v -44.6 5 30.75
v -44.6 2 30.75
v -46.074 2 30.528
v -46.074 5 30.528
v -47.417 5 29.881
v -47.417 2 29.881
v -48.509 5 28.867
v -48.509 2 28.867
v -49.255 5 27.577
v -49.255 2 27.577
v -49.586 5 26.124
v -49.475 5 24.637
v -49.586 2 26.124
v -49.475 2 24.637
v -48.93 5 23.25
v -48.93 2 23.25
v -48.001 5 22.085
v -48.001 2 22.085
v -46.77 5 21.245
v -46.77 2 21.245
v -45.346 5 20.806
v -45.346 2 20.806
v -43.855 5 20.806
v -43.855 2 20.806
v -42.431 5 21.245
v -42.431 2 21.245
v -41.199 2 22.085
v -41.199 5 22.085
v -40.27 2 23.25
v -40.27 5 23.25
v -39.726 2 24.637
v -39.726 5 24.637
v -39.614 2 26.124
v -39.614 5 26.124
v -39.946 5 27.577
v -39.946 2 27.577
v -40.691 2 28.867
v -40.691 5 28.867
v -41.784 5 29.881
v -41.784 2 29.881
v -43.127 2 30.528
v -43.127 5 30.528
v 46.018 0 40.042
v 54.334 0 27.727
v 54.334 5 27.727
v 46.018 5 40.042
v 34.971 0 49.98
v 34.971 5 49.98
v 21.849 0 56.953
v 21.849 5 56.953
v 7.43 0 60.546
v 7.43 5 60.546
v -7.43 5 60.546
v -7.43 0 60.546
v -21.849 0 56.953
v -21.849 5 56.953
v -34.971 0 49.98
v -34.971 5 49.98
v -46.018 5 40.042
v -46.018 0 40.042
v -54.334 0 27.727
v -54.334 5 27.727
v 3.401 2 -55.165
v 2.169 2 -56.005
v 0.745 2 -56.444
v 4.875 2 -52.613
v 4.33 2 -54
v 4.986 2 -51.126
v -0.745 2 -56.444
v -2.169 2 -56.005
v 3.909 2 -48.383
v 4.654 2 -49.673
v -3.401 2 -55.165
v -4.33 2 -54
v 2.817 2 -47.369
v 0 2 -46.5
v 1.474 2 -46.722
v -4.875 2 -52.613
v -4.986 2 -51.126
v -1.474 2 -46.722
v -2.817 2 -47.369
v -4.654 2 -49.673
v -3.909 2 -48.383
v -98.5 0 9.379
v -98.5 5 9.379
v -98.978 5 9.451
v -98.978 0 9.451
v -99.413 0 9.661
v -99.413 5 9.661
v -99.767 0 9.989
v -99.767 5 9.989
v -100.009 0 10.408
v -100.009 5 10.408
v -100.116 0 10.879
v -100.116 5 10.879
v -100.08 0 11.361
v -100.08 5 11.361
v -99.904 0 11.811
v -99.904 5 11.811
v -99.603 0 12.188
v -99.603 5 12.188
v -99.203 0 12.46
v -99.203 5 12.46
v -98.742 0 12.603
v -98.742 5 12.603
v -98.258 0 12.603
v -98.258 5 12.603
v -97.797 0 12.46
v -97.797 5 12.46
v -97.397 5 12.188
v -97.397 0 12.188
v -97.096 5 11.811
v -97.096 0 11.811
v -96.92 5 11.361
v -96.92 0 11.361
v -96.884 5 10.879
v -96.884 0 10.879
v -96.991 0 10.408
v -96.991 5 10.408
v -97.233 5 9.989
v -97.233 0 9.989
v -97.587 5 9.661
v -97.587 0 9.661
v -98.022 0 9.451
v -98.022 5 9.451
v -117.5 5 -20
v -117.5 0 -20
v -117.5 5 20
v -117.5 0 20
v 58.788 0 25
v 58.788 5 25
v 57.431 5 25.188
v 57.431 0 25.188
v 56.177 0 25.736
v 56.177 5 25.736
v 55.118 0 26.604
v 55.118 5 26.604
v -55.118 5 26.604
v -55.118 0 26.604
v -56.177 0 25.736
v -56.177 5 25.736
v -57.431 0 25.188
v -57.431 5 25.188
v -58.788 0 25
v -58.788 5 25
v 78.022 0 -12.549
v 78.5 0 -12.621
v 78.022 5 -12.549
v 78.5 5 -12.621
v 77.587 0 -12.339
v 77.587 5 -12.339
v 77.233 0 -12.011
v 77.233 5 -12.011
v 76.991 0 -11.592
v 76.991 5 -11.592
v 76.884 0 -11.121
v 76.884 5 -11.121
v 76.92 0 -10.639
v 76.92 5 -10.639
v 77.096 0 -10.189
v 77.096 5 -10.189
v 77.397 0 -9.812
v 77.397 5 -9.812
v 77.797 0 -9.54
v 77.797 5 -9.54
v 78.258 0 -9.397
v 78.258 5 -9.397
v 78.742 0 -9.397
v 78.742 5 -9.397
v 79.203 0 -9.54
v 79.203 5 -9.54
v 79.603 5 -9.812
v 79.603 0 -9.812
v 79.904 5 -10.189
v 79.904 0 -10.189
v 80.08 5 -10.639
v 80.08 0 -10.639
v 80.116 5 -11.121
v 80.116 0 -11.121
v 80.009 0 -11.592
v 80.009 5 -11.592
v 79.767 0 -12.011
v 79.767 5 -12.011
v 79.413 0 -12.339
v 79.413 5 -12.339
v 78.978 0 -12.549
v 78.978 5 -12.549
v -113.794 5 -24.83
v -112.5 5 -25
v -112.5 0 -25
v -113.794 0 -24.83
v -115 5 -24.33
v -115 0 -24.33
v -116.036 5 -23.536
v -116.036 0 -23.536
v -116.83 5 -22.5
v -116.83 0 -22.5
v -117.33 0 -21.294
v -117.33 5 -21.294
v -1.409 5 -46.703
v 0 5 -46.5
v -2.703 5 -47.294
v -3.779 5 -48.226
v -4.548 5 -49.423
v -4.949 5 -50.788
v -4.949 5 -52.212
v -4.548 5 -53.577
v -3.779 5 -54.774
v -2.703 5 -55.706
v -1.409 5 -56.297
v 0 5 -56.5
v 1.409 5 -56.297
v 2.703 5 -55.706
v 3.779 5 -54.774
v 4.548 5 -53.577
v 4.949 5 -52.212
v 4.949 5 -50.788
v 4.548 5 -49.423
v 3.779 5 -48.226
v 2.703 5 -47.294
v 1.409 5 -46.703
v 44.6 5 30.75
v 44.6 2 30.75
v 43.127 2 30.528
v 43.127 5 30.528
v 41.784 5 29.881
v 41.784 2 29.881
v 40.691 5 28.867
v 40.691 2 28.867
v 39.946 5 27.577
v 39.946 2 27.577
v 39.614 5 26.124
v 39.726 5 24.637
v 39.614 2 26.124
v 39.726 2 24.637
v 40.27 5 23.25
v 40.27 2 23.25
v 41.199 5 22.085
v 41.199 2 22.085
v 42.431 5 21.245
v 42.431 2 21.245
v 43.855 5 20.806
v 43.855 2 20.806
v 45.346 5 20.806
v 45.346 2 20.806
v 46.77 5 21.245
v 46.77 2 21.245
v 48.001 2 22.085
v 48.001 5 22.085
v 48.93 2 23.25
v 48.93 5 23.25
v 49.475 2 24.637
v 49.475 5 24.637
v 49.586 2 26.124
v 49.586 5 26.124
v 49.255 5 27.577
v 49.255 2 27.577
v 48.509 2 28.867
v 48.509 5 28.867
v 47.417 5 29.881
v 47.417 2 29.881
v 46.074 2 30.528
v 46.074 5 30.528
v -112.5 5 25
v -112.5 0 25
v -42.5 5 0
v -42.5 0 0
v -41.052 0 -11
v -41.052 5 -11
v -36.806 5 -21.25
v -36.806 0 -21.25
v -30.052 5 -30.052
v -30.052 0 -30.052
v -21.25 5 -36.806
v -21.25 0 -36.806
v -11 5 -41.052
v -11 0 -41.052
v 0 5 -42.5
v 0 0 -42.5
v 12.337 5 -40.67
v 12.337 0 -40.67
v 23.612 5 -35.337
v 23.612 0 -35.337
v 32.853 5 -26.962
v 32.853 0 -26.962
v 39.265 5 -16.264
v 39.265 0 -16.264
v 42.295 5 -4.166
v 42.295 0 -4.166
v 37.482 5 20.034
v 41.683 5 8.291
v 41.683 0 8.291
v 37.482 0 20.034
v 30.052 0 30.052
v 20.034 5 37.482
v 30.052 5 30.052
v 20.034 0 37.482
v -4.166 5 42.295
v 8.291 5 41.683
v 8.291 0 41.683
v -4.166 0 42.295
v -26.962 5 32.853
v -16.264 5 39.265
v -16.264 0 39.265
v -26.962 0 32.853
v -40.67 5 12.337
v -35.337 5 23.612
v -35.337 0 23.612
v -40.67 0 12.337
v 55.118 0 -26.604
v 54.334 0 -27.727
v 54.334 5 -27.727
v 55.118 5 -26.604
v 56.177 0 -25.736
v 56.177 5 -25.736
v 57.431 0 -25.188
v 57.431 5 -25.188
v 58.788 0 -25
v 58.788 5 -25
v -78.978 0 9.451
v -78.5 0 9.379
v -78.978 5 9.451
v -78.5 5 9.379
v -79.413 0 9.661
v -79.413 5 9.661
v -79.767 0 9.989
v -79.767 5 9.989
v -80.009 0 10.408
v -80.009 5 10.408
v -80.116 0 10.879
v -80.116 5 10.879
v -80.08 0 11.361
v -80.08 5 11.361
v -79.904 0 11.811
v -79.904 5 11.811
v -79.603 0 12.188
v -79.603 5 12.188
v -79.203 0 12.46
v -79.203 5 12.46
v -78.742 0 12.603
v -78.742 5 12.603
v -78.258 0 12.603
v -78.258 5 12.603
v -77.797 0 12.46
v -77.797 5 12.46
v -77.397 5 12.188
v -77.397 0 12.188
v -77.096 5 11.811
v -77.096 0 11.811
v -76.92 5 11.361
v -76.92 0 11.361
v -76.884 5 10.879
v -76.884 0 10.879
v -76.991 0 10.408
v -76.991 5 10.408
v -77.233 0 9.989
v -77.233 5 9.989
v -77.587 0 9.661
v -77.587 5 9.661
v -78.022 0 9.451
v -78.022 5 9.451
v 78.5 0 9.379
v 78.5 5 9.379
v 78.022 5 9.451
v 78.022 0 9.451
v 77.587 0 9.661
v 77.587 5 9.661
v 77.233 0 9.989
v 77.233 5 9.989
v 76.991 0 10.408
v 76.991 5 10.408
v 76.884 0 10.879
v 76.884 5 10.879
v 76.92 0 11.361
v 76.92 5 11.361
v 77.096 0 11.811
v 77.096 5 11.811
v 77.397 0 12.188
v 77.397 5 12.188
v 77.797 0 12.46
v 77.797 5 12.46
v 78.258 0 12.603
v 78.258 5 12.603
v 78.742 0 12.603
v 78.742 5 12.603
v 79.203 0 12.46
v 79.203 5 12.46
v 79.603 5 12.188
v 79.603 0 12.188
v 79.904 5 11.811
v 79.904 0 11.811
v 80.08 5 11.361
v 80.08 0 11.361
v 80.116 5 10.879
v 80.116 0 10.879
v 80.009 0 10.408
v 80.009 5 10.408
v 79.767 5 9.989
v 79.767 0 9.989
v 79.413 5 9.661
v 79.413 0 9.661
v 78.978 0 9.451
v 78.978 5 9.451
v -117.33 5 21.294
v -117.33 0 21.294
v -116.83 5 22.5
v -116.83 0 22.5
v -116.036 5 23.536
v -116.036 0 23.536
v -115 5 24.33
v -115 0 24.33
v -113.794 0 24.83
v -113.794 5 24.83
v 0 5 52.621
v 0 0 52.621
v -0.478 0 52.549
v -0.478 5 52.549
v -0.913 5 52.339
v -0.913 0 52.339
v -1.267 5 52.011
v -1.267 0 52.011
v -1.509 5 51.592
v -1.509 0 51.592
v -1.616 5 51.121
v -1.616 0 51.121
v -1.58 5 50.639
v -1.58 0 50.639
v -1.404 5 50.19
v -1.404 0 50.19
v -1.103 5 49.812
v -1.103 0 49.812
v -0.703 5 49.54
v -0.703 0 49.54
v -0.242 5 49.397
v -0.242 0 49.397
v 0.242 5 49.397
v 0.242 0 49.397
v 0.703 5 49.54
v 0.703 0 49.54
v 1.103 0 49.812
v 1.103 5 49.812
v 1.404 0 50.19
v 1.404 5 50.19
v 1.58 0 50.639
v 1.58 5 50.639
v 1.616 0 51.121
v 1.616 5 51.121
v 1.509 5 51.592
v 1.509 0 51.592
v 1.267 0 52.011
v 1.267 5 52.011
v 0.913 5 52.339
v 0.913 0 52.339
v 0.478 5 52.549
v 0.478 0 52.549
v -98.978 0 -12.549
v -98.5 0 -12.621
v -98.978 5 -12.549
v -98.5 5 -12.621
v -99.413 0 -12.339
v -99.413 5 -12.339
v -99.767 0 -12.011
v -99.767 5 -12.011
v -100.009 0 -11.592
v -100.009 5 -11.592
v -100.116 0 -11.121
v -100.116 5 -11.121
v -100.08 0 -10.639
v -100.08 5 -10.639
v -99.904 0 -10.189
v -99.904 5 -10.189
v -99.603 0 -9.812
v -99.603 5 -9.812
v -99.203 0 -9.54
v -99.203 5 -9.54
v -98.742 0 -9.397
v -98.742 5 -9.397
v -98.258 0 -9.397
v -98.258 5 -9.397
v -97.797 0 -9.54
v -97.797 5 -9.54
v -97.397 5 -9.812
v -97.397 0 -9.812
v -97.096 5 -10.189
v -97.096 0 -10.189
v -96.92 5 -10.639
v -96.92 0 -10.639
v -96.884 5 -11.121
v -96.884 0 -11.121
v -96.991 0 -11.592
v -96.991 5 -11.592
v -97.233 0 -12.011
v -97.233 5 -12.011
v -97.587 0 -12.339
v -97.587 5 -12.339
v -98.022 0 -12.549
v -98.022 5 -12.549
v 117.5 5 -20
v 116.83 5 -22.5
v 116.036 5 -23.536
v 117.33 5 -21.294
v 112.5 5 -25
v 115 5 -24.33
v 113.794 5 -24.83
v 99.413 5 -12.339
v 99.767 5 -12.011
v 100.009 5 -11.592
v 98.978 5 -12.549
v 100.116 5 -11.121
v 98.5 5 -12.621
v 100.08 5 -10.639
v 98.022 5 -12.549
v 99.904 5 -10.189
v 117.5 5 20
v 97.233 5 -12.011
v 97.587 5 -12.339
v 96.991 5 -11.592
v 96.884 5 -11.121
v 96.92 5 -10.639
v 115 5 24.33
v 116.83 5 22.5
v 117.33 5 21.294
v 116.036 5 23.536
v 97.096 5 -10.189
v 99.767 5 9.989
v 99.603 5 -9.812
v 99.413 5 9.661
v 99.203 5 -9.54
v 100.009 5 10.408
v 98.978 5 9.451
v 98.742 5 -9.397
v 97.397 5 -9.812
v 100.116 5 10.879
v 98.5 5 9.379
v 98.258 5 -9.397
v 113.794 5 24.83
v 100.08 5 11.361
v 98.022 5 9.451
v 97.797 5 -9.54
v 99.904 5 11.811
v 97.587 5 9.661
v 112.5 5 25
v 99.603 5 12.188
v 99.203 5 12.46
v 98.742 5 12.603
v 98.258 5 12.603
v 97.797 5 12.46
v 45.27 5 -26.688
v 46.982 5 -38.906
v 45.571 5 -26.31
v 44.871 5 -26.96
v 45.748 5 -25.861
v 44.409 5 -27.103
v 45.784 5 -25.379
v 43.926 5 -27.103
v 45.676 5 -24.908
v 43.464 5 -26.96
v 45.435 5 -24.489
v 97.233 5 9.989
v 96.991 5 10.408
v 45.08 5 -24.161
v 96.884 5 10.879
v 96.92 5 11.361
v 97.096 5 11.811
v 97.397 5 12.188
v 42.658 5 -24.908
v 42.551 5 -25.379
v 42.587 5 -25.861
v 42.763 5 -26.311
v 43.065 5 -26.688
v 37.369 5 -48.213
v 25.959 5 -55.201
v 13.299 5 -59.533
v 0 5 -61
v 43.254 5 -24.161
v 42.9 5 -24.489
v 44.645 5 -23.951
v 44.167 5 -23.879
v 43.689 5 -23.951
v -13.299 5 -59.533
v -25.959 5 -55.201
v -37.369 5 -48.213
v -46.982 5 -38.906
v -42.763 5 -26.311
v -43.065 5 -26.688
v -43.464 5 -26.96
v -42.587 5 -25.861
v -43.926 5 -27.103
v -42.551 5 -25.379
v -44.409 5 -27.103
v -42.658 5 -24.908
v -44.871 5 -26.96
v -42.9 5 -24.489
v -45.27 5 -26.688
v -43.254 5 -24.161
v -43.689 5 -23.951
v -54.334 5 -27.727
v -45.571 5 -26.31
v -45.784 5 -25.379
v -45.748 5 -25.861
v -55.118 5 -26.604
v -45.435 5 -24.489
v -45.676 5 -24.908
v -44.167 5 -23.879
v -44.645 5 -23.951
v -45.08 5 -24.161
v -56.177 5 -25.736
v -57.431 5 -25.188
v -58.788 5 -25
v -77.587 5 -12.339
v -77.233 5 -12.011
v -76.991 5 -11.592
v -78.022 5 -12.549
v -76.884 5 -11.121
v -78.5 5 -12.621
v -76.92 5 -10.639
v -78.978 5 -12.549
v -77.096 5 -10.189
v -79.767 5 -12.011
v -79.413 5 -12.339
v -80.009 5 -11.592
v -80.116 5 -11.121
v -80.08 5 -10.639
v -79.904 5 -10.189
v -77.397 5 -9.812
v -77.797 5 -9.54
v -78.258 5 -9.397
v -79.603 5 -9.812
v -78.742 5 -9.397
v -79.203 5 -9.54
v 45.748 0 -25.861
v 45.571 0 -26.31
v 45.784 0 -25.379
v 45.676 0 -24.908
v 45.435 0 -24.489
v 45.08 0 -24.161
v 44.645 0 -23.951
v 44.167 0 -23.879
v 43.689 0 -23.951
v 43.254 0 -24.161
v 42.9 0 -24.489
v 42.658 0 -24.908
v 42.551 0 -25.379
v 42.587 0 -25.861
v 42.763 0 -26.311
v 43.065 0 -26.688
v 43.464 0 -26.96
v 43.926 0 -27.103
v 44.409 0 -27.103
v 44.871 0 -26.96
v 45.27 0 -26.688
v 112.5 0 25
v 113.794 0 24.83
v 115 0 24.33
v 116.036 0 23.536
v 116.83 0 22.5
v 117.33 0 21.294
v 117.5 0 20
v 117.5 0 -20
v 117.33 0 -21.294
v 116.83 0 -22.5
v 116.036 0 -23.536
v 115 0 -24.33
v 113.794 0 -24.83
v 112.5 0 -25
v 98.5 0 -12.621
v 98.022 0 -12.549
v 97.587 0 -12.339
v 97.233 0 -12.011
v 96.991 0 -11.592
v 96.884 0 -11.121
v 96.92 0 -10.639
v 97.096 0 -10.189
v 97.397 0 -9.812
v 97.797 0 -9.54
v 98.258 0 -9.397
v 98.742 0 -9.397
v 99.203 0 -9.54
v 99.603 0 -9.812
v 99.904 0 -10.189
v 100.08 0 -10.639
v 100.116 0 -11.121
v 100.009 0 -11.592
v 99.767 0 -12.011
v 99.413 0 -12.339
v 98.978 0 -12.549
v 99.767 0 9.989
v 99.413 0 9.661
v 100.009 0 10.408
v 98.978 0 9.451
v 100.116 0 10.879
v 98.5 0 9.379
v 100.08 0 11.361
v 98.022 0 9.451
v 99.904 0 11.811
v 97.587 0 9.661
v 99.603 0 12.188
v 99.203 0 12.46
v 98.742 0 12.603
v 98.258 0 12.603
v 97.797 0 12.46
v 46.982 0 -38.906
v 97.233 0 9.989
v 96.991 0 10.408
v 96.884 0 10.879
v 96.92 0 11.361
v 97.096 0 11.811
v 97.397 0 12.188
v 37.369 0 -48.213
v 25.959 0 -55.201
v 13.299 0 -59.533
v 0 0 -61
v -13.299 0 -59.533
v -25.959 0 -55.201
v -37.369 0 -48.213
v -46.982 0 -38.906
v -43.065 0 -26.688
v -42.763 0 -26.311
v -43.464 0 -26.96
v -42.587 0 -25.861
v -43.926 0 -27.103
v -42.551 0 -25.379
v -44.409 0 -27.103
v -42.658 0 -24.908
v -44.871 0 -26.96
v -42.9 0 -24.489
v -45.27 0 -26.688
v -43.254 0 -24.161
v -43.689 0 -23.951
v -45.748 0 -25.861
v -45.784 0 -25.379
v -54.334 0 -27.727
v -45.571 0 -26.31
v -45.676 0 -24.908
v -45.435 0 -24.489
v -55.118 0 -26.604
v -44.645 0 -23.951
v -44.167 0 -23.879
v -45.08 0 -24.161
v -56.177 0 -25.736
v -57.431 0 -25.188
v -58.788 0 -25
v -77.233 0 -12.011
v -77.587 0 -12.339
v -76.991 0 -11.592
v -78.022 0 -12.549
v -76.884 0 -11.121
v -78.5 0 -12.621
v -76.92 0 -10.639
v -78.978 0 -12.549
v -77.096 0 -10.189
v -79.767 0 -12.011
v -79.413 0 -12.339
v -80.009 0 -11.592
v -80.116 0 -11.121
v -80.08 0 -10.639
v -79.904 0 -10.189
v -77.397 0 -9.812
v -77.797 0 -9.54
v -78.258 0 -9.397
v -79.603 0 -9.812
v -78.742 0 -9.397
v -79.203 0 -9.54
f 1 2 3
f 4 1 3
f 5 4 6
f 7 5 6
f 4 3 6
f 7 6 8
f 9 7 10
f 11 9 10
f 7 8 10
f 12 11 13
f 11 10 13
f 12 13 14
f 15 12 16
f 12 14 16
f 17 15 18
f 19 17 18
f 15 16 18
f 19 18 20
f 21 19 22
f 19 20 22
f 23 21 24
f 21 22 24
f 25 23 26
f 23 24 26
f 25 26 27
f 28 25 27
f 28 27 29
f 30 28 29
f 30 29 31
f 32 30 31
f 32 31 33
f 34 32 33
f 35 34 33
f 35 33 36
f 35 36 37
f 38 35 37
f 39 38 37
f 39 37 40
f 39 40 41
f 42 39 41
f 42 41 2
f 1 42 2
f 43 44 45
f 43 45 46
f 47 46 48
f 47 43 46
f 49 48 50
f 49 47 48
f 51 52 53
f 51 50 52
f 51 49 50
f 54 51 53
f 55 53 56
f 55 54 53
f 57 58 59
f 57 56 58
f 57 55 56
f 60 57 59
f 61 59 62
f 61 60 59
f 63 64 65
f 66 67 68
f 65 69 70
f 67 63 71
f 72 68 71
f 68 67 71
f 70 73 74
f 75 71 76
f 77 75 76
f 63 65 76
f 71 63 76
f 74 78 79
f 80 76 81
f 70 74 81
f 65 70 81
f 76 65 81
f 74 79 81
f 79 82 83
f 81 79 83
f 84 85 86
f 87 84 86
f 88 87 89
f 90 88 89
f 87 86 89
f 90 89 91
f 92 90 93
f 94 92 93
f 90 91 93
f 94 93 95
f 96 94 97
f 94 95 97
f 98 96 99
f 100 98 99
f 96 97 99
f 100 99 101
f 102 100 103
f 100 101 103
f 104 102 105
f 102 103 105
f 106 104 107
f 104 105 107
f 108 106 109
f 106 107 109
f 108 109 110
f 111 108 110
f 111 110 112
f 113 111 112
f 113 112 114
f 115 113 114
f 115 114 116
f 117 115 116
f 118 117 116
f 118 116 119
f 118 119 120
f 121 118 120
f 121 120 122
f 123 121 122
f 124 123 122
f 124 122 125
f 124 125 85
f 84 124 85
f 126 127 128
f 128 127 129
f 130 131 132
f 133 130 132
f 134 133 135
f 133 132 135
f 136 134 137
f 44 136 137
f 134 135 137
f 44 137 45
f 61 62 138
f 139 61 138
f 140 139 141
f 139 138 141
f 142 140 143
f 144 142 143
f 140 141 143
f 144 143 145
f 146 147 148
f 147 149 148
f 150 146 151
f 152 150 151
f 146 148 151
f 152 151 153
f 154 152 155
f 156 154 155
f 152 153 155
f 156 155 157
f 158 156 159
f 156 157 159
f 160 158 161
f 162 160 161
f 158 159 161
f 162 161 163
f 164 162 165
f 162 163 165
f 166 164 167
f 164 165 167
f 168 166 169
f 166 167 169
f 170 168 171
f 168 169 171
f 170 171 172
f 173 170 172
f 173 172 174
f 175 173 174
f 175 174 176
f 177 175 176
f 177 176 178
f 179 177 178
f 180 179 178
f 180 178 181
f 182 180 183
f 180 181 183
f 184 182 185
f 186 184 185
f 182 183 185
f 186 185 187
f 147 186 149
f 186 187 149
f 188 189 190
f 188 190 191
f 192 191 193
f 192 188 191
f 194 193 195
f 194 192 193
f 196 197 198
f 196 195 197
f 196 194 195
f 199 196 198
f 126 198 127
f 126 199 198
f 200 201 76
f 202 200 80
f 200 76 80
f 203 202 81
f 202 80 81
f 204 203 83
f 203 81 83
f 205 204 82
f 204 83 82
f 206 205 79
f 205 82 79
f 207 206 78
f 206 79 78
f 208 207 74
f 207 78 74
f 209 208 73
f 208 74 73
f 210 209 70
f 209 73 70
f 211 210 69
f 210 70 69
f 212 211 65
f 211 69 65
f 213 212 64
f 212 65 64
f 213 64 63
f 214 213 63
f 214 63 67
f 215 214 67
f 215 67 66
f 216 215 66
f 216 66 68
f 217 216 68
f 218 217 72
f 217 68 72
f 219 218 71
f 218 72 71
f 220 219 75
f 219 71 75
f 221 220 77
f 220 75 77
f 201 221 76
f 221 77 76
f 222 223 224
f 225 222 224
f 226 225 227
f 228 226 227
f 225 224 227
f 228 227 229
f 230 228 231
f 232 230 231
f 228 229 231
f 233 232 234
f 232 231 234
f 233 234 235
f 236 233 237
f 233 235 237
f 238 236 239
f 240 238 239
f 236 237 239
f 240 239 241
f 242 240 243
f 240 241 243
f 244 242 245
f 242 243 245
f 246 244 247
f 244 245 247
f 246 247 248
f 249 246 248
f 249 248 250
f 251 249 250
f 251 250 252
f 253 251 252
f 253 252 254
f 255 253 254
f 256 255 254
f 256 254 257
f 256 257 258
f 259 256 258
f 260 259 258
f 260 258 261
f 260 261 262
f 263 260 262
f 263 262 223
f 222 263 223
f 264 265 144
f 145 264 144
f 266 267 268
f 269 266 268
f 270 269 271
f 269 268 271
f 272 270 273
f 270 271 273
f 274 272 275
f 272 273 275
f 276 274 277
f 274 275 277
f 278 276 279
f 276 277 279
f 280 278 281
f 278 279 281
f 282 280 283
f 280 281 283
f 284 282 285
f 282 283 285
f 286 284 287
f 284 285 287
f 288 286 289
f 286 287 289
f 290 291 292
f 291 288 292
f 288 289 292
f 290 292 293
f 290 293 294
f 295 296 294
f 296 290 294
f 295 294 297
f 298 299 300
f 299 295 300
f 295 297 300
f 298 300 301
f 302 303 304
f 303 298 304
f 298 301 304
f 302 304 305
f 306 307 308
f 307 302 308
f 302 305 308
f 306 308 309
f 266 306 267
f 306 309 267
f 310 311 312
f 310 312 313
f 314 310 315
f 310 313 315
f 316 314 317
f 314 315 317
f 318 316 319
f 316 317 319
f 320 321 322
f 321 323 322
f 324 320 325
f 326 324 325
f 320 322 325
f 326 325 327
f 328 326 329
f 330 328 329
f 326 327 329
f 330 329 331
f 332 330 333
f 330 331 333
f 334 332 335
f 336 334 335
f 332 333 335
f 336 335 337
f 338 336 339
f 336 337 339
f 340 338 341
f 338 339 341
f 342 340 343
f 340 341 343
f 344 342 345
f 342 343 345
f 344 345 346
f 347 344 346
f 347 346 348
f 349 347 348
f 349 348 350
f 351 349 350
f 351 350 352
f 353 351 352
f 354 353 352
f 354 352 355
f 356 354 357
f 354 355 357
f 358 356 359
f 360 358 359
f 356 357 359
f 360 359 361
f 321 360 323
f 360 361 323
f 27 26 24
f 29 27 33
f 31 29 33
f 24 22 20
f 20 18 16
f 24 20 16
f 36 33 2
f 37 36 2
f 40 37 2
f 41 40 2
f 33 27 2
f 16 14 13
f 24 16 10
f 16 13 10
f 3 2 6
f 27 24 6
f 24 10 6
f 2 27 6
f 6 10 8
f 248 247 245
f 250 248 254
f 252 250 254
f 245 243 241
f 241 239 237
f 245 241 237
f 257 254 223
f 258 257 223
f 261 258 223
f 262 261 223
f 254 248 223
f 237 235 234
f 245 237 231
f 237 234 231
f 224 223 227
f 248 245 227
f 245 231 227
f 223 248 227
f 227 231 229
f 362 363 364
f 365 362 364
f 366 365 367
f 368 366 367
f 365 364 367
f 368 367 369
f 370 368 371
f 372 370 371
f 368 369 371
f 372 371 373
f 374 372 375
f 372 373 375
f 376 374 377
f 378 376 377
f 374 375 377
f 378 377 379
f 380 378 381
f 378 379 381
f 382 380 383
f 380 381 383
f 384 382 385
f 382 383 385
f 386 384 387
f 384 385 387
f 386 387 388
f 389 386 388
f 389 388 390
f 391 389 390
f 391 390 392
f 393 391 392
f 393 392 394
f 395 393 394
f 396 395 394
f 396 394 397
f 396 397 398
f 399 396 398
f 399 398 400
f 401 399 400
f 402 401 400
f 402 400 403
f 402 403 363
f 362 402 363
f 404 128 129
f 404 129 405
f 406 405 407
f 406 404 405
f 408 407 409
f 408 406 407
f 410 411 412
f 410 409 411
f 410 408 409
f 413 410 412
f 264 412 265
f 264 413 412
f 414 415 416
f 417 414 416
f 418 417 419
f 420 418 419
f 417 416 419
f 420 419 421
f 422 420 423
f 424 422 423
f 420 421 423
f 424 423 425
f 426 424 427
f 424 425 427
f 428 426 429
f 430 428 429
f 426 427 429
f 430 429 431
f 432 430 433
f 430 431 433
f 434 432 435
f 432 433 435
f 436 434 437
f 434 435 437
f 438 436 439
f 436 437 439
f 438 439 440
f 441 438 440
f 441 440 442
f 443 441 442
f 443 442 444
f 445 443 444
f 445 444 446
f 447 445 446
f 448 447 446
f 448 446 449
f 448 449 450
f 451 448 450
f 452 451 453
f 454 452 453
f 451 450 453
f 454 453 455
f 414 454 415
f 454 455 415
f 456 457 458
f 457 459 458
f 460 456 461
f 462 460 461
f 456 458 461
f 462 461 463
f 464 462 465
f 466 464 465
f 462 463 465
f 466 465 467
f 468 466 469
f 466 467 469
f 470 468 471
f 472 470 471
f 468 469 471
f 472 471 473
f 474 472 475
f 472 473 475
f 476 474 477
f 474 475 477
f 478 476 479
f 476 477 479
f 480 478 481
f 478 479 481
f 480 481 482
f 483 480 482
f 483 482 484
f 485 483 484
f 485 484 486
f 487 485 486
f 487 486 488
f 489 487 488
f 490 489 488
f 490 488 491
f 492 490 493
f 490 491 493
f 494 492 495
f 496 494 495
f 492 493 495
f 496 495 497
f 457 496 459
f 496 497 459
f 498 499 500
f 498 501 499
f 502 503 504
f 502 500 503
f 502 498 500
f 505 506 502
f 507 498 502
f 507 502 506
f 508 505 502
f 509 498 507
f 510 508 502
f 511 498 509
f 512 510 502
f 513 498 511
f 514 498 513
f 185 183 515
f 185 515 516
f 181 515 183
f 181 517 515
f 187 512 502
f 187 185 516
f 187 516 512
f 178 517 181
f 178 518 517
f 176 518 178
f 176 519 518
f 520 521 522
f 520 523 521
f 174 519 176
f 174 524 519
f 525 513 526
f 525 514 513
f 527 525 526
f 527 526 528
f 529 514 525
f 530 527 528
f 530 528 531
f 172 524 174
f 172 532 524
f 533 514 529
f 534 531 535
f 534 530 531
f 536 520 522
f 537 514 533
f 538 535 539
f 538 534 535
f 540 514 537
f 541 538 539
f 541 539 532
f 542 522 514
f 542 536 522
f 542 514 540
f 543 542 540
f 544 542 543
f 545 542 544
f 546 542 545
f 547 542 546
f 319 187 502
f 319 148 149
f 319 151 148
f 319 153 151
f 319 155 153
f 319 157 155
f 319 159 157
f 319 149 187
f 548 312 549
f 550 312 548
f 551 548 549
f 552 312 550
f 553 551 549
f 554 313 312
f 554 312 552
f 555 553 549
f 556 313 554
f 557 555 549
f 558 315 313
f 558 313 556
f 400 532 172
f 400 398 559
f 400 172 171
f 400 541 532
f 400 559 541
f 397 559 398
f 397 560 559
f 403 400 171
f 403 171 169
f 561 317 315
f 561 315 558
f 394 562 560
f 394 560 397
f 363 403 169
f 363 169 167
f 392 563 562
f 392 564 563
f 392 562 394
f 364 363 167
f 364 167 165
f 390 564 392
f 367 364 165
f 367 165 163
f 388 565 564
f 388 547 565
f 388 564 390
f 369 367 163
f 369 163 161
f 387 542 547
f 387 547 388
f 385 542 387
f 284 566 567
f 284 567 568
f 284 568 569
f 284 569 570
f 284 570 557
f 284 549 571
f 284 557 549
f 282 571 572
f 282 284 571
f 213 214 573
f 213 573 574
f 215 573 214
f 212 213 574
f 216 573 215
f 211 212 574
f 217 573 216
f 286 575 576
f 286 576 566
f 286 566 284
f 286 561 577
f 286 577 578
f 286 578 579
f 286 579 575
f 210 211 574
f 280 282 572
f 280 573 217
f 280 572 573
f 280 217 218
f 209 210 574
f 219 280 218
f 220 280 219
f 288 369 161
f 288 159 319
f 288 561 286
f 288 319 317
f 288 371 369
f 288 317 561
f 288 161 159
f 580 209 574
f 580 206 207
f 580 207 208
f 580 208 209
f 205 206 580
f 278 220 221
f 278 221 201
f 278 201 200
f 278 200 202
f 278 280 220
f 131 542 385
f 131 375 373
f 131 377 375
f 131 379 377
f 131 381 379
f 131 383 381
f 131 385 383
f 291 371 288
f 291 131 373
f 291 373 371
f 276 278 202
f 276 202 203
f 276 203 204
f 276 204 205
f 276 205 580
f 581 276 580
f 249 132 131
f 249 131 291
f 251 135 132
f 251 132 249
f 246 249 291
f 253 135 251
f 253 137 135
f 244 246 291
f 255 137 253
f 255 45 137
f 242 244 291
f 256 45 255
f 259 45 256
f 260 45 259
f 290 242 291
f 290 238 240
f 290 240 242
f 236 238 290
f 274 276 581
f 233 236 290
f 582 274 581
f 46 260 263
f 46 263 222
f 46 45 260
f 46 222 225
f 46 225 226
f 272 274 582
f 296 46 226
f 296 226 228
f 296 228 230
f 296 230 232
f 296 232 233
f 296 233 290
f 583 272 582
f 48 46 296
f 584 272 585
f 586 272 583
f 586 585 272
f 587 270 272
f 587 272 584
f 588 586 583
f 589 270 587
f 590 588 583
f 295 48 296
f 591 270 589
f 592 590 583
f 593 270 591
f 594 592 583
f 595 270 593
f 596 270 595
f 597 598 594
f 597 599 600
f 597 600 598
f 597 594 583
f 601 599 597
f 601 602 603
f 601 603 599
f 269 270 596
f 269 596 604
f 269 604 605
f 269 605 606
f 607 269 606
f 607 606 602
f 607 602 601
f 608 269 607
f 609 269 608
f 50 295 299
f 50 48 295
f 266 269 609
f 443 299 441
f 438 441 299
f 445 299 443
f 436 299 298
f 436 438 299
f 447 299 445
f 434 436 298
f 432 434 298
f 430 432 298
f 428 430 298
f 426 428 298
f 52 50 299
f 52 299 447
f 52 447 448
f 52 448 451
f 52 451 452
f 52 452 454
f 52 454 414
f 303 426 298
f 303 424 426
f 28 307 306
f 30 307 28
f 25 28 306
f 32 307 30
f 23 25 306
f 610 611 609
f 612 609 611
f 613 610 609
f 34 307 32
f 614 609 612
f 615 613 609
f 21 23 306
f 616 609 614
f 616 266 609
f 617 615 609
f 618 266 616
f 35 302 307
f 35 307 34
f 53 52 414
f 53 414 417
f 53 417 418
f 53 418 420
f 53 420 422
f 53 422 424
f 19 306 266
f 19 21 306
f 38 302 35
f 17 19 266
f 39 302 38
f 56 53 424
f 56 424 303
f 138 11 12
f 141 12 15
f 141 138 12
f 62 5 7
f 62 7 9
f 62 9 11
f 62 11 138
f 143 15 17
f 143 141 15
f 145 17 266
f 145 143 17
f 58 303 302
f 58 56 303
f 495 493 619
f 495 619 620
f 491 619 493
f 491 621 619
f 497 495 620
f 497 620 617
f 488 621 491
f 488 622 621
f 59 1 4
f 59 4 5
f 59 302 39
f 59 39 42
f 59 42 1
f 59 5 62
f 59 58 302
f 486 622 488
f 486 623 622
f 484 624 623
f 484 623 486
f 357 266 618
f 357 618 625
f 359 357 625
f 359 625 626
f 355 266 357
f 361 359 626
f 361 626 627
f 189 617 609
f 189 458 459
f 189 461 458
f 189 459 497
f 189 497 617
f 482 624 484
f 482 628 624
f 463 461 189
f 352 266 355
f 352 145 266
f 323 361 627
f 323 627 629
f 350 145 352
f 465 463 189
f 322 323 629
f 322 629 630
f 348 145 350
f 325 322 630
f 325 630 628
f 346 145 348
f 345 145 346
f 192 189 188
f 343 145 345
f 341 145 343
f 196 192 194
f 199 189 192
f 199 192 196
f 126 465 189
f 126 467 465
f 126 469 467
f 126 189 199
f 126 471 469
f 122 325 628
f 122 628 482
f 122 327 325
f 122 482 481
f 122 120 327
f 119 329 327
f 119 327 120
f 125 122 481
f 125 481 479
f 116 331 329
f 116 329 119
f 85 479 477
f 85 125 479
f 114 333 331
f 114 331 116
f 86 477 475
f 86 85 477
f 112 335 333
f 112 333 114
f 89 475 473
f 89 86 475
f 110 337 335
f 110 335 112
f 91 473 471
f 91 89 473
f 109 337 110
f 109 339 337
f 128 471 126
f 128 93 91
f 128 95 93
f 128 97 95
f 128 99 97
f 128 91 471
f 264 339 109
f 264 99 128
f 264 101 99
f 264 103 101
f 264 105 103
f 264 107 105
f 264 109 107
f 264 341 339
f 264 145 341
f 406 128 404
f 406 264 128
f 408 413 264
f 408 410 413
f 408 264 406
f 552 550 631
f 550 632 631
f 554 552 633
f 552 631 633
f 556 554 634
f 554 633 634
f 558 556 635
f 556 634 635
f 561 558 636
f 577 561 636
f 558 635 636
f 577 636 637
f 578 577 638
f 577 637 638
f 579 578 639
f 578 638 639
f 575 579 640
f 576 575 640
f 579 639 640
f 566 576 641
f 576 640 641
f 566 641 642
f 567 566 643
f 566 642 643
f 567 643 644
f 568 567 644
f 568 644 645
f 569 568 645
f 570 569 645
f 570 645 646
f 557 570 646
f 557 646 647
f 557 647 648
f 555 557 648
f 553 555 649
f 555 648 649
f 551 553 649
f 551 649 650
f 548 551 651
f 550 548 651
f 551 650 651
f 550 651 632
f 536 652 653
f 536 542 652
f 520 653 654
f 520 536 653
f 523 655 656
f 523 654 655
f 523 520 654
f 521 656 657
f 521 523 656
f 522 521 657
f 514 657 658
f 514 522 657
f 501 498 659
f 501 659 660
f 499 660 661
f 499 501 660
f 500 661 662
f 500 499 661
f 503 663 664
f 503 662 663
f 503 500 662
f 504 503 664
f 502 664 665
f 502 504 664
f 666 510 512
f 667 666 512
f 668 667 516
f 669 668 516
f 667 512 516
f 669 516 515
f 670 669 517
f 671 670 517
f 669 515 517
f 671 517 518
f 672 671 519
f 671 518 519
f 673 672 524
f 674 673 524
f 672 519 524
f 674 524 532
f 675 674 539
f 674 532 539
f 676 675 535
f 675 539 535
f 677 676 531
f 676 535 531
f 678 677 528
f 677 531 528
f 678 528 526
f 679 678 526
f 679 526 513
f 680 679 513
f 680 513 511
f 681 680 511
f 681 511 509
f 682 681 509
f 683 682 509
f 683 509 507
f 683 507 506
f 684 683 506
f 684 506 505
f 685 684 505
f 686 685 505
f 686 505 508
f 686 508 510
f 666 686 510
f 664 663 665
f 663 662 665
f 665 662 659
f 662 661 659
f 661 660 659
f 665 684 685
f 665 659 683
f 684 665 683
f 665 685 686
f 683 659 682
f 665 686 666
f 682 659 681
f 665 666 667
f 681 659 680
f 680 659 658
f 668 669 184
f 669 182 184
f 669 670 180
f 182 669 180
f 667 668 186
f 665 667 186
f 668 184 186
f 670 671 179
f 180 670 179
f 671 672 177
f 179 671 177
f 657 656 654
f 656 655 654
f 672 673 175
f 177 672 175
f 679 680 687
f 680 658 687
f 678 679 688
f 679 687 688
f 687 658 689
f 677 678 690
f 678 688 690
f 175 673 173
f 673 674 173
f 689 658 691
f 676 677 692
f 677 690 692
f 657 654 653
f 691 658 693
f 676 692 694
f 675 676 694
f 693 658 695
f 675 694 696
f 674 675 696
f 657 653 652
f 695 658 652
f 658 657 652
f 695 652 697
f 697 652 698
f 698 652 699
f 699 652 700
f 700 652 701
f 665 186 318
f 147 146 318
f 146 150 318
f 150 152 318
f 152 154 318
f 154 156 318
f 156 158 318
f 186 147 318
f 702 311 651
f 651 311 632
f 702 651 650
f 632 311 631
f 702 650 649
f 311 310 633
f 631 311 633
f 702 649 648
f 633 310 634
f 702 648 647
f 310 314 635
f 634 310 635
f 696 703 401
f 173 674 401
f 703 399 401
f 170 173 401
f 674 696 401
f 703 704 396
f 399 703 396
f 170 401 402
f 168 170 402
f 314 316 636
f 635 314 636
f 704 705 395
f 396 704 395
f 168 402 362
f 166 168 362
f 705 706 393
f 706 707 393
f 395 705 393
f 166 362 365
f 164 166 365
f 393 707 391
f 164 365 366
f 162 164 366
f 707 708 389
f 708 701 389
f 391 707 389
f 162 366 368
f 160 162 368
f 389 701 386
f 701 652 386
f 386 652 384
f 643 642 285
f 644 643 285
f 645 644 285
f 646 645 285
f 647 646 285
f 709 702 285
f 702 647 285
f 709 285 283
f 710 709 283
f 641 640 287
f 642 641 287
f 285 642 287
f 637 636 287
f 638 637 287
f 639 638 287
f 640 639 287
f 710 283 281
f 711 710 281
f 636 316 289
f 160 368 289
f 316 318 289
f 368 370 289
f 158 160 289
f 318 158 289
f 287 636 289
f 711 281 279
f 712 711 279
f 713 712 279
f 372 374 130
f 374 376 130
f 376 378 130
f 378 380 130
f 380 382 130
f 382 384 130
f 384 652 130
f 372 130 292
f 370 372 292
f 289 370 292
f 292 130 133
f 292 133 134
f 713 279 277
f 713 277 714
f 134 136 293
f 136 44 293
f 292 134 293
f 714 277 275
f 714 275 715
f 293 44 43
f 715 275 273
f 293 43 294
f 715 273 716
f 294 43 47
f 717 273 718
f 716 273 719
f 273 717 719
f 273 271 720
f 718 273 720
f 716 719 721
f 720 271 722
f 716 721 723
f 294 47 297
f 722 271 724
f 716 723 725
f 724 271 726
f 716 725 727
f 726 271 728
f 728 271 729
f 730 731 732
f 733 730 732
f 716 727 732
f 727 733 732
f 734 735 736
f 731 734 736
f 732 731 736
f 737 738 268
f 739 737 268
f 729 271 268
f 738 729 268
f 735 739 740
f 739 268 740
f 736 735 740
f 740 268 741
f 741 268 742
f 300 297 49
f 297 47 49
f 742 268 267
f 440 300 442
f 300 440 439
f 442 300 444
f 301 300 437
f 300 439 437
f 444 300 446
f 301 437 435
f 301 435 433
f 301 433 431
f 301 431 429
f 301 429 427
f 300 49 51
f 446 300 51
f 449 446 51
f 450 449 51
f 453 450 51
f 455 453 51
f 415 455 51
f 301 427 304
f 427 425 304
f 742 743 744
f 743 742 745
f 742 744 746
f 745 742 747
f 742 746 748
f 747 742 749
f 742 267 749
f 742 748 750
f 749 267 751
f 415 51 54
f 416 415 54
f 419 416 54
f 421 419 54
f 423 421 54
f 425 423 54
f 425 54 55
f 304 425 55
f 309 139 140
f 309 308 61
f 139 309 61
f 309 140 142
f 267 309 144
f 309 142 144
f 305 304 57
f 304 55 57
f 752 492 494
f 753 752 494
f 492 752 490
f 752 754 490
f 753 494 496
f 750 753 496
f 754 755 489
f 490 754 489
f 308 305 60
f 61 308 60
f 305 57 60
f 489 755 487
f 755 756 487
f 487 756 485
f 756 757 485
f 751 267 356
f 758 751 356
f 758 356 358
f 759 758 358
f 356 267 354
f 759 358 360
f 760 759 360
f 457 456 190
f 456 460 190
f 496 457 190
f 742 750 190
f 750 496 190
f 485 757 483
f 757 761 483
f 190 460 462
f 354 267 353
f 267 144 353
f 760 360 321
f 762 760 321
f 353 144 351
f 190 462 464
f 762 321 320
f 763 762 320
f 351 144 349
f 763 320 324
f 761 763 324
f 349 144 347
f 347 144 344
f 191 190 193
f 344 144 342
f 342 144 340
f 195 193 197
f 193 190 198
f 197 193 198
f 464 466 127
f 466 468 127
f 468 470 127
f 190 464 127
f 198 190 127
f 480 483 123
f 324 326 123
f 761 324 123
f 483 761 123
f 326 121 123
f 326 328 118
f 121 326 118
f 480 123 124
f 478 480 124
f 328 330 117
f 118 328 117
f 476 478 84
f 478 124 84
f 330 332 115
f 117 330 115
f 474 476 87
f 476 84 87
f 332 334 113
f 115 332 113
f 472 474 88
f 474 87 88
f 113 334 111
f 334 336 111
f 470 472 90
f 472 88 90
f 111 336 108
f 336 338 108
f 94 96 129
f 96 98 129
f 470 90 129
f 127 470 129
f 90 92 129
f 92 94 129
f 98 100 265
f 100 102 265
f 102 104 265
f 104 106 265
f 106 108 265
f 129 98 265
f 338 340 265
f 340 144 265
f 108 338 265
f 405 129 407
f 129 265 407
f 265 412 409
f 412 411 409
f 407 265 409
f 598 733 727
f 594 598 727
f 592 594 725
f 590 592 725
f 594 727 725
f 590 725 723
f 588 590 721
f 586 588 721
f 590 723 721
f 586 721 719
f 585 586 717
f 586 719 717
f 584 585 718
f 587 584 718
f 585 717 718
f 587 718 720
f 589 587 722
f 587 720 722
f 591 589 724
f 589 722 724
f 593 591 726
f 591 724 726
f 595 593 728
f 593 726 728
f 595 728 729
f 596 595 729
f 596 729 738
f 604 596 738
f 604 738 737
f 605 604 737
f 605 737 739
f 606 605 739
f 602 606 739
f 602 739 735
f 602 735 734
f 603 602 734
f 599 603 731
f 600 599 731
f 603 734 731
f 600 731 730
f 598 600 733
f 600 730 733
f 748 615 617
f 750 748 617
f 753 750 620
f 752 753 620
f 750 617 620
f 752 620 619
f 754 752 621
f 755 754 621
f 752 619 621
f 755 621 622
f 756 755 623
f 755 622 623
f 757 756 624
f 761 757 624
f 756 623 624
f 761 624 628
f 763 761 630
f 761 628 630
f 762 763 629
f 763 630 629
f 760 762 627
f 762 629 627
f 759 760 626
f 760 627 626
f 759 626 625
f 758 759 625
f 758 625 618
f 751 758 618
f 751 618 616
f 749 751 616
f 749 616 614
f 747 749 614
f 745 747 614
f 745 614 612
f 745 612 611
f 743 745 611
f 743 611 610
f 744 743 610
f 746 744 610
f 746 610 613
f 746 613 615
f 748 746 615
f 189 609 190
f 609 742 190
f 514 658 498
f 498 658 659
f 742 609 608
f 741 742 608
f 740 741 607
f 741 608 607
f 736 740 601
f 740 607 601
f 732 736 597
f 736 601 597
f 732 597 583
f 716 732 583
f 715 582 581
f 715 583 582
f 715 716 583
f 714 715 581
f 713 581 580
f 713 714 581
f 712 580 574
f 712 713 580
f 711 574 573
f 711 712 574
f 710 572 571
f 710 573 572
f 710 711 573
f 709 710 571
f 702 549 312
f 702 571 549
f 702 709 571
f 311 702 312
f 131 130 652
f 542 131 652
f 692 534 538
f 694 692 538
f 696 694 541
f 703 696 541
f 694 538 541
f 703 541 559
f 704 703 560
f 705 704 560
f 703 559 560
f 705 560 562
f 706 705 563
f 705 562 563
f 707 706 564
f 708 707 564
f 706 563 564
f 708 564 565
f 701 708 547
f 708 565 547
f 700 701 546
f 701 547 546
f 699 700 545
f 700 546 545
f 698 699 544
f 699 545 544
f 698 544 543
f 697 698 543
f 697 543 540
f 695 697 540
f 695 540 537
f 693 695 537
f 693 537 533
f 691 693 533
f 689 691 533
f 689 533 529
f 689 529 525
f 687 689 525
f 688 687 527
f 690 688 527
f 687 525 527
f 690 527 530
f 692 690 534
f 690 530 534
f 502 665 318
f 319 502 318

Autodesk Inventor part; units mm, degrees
ref_plane "YZ Plane" through (0, 0, 0) normal (1, 0, 0) x (0, 1, 0)
ref_plane "XZ Plane" through (0, 0, 0) normal (0, 1, 0) x (-1, 0, 0)
ref_plane "XY Plane" through (0, 0, 0) normal (0, 0, 1) x (1, 0, 0)
sketch "Sketch1" plane through (0, 0, 0) normal (0, 1, 0) x (-1, 0, 0)
  circle A0 centre (0, 0) radius 42.5
  arc A1 (55.6417, 25) -> (-55.6417, 25) centre (0, 0) ccw
  line L0 (0, 0) -> (0, -61)
  line L1 (0, 0) -> (0, 0)
  line L2 (0, 0) -> (0, -90.4875)
  line L3 (-117.5, 25) -> (-117.5, -25)
  line L4 (117.5, -25) -> (117.5, 25)
  line L5 (117.5, 25) -> (-117.5, -25) construction
  line L6 (-117.5, 25) -> (117.5, -25) construction
  line L7 (117.5, 25) -> (55.6417, 25)
  line L8 (-55.6417, 25) -> (-117.5, 25)
  line L9 (55.6417, -25) -> (117.5, -25)
  line L10 (-117.5, -25) -> (-55.6417, -25)
  arc A2 (-55.6417, -25) -> (55.6417, -25) centre (0, 0) ccw
  dimension "d0" = 85
  dimension "d29" = 61
  dimension "d46" = 235
  dimension "d47" = 50
extrude "Extrusion1" add sketch "Sketch1" along normal blind 5
sketch "Sketch2" plane through (0, 0, 0) normal (0, -1, 0) x (1, 0, 0)
  line L0 (-117.5, -25) -> (-117.5, 25) projected
  line L1 (-117.5, 0) -> (117.5, 0)
  line L2 (117.5, 25) -> (117.5, -25) projected
  arc A0 (55.6417, 25) -> (-55.6417, 25) centre (0, 0) ccw projected
  line L3 (0, 61) -> (0, -61)
  arc A1 (-55.6417, -25) -> (55.6417, -25) centre (0, 0) ccw projected
  circle A2 centre (-98.5, 11) radius 2
  line L4 (-117.5, 25) -> (-55.6417, 25) projected
  circle A3 centre (-78.5, 11) radius 2
  circle A4 centre (-98.5, -11) radius 2
  circle A5 centre (-78.5, -11) radius 2
  circle A6 centre (98.5, 11) radius 2
  circle A7 centre (78.5, 11) radius 2
  circle A8 centre (98.5, -11) radius 2
  circle A9 centre (78.5, -11) radius 2
  dimension "d51" = 4
  dimension "d52" = 19
  dimension "d53" = 14
  dimension "d54" = 4
  dimension "d55" = 20
hole "Hole1" at (-98.5, 0, 11) at (-78.5, 0, 11) at (-78.5, 0, -11) at (-98.5, 0, -11) at (78.5, 0, 11) at (98.5, 0, 11) at (98.5, 0, -11) at (78.5, 0, -11) direction (0, 1, 0) diameter 3.242 depth 11.8 tip angle 118 thread size "M4x0.7" class "6H" standard "ANSI Metric M Profile"
fillet "Fillet2" radius 5 8 edges at (-117.5, 2.5, -25) (-55.6417, 2.5, -25) (117.5, 2.5, -25) (55.6417, 2.5, -25) (117.5, 2.5, 25) (55.6417, 2.5, 25) (-55.6417, 2.5, 25) (-117.5, 2.5, 25)
sketch "Sketch4" plane through (0, 5, 0) normal (0, 1, 0) x (1, 0, 0)
  circle A0 centre (0, 0) radius 51.5
  point P0 (0, 51.5)
  point P1 (-44.6003, -25.75)
  point P2 (44.6003, -25.75)
  dimension "d57" = 103
  dimension "d60" = 360
hole "Pins" at (0, 5, -51.5) at (-44.6003, 5, 25.75) at (44.6003, 5, 25.75) direction (0, -1, 0) diameter 10 depth 3
sketch "Sketch5" plane through (0, 5, 0) normal (0, 1, 0) x (1, 0, 0)
  circle A0 centre (0, 0) radius 51
  point P0 (0, -51)
  point P1 (0, -51)
  dimension "d69" = 102
hole "Mounting Holes" at (0, 5, 51) direction (0, -1, 0) diameter 3.242 end through all thread size "M4x0.7" class "6H" standard "ANSI Metric M Profile"
pattern_circular "Circular Pattern1" count 3 over 360 about axis through (0, -10, 0) along (0, 1, 0) of "Mounting Holes"
properties part number "Metal Head Thing"
